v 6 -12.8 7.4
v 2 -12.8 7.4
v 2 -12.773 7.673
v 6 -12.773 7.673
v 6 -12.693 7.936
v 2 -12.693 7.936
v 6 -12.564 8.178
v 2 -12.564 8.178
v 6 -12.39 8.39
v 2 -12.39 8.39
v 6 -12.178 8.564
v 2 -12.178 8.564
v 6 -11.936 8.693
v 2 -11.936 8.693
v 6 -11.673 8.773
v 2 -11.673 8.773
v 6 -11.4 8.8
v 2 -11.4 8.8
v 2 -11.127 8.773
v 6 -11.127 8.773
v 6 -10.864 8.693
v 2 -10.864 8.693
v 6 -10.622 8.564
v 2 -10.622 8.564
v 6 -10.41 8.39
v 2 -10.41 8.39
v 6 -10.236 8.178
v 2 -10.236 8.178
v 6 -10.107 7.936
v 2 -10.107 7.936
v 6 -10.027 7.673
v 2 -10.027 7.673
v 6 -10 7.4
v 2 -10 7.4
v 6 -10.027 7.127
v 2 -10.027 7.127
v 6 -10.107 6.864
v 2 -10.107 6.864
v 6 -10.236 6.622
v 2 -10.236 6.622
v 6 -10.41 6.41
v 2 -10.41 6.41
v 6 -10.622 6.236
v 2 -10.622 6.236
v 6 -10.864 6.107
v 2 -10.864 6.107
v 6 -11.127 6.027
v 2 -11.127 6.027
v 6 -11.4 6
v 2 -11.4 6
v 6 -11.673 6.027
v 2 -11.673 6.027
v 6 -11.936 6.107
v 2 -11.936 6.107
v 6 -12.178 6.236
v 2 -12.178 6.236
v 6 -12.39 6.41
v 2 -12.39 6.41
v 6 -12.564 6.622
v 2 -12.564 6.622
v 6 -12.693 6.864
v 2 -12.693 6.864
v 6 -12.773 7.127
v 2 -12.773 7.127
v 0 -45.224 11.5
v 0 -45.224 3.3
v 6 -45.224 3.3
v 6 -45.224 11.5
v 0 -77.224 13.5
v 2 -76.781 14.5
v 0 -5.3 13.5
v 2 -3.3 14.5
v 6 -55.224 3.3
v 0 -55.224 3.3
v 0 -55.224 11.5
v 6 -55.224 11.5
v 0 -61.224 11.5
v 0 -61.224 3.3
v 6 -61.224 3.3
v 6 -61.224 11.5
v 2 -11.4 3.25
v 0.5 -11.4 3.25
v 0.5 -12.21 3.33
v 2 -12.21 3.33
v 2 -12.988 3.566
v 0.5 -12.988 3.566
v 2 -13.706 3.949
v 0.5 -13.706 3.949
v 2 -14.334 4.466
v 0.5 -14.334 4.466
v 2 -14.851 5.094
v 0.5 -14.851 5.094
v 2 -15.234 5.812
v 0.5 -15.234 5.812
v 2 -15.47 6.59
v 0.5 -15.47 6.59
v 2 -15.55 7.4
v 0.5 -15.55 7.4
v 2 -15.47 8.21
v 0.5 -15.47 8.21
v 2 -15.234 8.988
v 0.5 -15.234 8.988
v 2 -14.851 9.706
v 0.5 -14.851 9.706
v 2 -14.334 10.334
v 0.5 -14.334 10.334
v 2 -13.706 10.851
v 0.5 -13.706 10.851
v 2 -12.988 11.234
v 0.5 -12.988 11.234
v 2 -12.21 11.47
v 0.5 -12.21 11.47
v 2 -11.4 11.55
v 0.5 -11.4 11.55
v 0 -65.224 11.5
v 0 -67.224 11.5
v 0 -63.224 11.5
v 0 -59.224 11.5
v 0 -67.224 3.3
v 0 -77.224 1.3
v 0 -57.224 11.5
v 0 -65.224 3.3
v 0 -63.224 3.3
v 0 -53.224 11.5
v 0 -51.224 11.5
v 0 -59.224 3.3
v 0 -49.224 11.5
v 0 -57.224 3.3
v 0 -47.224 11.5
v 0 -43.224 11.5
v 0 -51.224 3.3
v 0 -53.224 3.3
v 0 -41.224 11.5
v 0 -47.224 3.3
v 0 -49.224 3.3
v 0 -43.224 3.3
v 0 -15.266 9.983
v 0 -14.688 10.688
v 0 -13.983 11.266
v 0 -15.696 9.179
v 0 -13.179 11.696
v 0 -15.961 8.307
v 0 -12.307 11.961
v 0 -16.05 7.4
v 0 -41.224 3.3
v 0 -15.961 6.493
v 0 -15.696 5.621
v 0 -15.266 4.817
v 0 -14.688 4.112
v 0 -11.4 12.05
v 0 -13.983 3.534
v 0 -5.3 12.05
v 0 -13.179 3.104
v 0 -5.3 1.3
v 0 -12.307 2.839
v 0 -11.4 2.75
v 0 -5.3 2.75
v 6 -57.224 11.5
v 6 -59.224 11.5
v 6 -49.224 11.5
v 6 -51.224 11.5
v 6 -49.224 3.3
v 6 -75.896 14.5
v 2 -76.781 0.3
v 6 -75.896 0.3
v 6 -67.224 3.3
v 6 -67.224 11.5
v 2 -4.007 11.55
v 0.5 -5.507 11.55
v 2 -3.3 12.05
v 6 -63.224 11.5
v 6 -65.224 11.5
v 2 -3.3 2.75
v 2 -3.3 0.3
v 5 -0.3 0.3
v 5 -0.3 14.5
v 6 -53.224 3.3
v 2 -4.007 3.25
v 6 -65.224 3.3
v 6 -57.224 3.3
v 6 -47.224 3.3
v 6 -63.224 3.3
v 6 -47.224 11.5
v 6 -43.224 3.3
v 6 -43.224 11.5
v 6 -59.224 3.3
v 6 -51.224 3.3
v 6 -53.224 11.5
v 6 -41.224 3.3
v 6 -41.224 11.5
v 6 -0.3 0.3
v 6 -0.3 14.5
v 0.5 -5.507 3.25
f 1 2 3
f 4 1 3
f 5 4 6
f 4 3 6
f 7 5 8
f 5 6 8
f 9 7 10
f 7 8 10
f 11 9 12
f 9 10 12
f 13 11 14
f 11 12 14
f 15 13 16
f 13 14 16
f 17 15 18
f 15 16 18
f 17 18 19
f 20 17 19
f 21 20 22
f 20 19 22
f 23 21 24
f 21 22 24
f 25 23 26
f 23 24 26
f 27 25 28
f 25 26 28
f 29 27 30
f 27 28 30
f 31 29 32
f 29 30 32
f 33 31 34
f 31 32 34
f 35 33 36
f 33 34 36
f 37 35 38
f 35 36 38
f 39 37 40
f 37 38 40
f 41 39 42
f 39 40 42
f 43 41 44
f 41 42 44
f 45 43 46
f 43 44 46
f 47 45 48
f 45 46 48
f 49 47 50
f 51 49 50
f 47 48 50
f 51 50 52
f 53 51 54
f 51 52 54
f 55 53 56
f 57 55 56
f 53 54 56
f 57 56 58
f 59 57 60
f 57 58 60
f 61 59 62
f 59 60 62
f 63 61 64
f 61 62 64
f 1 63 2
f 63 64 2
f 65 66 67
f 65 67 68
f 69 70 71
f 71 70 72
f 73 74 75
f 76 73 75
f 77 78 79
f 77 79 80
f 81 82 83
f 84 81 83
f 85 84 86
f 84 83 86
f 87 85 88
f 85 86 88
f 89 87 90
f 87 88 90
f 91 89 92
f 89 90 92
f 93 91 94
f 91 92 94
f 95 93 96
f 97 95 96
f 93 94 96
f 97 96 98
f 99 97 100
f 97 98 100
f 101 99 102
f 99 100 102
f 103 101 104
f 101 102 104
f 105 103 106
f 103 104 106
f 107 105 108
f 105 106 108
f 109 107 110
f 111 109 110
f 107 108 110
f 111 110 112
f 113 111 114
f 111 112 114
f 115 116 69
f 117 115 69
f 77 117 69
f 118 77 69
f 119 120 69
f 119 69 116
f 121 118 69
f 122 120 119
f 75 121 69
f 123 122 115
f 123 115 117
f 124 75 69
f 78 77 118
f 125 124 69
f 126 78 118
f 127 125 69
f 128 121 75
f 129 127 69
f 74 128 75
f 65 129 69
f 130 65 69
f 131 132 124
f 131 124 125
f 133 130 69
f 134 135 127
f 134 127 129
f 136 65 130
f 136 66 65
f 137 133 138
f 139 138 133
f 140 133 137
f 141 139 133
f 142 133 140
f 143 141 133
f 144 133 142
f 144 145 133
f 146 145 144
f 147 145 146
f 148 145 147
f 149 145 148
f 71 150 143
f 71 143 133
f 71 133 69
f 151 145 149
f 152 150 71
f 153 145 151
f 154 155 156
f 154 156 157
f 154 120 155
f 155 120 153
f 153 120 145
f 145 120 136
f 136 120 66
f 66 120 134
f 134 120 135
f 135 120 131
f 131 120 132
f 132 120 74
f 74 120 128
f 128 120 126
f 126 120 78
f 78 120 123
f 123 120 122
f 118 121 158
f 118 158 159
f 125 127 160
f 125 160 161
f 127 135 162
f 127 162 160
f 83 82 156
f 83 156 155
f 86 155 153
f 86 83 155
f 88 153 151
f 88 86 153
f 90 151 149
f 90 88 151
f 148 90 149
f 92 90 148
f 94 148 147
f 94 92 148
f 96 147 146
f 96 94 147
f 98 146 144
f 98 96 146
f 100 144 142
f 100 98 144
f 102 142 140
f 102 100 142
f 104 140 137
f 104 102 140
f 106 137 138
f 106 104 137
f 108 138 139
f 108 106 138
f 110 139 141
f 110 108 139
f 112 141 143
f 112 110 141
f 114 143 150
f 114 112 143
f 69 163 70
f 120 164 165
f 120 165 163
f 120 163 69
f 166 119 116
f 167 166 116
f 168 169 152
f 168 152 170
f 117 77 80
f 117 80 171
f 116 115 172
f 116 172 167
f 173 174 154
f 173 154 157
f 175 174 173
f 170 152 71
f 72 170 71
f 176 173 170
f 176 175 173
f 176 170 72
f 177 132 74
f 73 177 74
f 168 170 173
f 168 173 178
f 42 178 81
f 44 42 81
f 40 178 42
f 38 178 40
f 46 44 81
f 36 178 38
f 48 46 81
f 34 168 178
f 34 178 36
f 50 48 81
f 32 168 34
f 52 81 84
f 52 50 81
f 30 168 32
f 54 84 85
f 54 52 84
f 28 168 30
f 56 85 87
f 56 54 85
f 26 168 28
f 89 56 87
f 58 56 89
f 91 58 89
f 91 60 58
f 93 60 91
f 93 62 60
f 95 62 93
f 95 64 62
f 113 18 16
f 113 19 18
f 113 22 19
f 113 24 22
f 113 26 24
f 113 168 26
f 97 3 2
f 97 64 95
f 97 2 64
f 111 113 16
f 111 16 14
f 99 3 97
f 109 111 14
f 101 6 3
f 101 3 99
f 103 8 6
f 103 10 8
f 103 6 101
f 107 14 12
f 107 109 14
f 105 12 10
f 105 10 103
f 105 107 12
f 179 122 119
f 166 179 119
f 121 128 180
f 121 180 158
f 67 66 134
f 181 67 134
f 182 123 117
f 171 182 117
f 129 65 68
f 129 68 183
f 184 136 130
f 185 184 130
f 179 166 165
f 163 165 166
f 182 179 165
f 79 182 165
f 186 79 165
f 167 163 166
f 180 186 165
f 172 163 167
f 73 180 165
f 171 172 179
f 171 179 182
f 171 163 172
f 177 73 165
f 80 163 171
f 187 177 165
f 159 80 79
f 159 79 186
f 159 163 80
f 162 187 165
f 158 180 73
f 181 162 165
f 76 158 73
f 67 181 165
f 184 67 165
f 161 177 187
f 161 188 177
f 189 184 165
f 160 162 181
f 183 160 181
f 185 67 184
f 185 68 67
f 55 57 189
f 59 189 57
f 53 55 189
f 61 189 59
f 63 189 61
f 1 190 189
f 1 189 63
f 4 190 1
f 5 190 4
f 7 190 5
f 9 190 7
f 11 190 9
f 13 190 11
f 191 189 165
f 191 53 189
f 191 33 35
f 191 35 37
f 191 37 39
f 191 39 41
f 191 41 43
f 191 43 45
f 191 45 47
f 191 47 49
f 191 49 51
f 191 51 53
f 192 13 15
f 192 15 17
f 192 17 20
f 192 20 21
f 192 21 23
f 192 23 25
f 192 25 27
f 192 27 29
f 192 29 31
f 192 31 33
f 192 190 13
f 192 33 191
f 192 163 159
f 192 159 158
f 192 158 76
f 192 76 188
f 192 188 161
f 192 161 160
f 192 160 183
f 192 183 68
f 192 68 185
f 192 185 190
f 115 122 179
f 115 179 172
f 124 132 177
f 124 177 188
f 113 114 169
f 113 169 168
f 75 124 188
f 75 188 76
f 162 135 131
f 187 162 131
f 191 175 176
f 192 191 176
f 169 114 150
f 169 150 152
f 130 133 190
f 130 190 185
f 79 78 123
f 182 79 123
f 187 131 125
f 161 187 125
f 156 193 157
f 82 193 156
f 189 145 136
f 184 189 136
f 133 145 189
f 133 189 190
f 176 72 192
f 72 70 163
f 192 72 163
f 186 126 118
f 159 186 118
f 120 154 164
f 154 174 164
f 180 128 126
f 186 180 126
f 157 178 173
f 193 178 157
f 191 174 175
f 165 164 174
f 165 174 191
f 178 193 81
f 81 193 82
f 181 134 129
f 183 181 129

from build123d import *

# Parameters (mm, degrees)
F0_W      = 75.59621
F0_H      = 14.2
F1_DEPTH  = 6
F3_DEPTH  = 14.2
F4_SIZE2  = 2
F4_SIZE   = 1
F5_SIZE2  = 5
F5_SIZE   = 5
F6_W      = 2
F6_H      = 8.2
F7_DEPTH  = 6
F9_DEPTH  = 2
F10_SIZE  = 0.5
F11_R     = 1.4
F12_DEPTH = 4


with BuildPart() as f1:
    # F0 (on Right) → F1 (new body)
    with BuildSketch(Plane.YZ):
        with Locations((-38.098105, 7.4)):
            Rectangle(F0_W, F0_H)
    extrude(amount=F1_DEPTH)

    # F2 (on face) → F3 (join, through all)
    with BuildSketch(Plane(origin=(0, 0, 0.3), x_dir=(1, 0, 0), z_dir=(0, 0, -1))):
        Polygon((0, 77.2236436599), (0, 75.89621), (6, 75.89621), align=None)
    extrude(amount=-F3_DEPTH)

    # F4
    f4_edges = [f1.edges().sort_by_distance(p)[0] for p in [
        (0, -38.761822, 0.3),
        (0, -38.761822, 14.5),
    ]]
    chamfer(f4_edges, length=F4_SIZE, length2=F4_SIZE2)

    # F5
    f5_edges = [f1.edges().sort_by_distance(p)[0] for p in [
        (0, -0.3, 7.4),
    ]]
    chamfer(f5_edges, length=F5_SIZE, length2=F5_SIZE2)

    # F6 (on face) → F7 (cut, through all)
    with BuildSketch(Plane(origin=(0, 0, 0), x_dir=(0, -1, 0), z_dir=(-1, 0, 0))):
        with Locations((42.2236436599, 7.4)):
            Rectangle(F6_W, F6_H)
        with Locations((66.2236436599, 7.4)):
            Rectangle(F6_W, F6_H)
        with Locations((46.2236436599, 7.4)):
            Rectangle(F6_W, F6_H)
        with Locations((50.2236436599, 7.4)):
            Rectangle(F6_W, F6_H)
        with Locations((54.2236436599, 7.4)):
            Rectangle(F6_W, F6_H)
        with Locations((58.2236436599, 7.4)):
            Rectangle(F6_W, F6_H)
        with Locations((62.2236436599, 7.4)):
            Rectangle(F6_W, F6_H)
    extrude(amount=-F7_DEPTH, mode=Mode.SUBTRACT)

    # F8 (on face) → F9 (cut)
    with BuildSketch(Plane(origin=(0, 0, 0), x_dir=(0, -1, 0), z_dir=(-1, 0, 0))):
        with BuildLine():
            Line((0.3, 3.25), (11.4, 3.25))
            ThreePointArc((11.4, 3.25), (15.55, 7.4), (11.4, 11.55))
            Line((11.4, 11.55), (0.3, 11.55))
            Line((0.3, 11.55), (0.3, 3.25))
        make_face()
    extrude(amount=-F9_DEPTH, mode=Mode.SUBTRACT)

    # F10
    f10_edges = [f1.edges().sort_by_distance(p)[0] for p in [
        (1, -4.3, 11.55),
        (0, -8.35, 11.55),
        (1, -4.3, 3.25),
    ]]
    chamfer(f10_edges, length=F10_SIZE)

    # F11 (on face) → F12 (cut, through all)
    with BuildSketch(Plane(origin=(2, 0, 0), x_dir=(0, -1, 0), z_dir=(-1, 0, 0))):
        with Locations((11.4, 7.4)):
            Circle(F11_R)
    extrude(amount=-F12_DEPTH, mode=Mode.SUBTRACT)


solid = f1.part
